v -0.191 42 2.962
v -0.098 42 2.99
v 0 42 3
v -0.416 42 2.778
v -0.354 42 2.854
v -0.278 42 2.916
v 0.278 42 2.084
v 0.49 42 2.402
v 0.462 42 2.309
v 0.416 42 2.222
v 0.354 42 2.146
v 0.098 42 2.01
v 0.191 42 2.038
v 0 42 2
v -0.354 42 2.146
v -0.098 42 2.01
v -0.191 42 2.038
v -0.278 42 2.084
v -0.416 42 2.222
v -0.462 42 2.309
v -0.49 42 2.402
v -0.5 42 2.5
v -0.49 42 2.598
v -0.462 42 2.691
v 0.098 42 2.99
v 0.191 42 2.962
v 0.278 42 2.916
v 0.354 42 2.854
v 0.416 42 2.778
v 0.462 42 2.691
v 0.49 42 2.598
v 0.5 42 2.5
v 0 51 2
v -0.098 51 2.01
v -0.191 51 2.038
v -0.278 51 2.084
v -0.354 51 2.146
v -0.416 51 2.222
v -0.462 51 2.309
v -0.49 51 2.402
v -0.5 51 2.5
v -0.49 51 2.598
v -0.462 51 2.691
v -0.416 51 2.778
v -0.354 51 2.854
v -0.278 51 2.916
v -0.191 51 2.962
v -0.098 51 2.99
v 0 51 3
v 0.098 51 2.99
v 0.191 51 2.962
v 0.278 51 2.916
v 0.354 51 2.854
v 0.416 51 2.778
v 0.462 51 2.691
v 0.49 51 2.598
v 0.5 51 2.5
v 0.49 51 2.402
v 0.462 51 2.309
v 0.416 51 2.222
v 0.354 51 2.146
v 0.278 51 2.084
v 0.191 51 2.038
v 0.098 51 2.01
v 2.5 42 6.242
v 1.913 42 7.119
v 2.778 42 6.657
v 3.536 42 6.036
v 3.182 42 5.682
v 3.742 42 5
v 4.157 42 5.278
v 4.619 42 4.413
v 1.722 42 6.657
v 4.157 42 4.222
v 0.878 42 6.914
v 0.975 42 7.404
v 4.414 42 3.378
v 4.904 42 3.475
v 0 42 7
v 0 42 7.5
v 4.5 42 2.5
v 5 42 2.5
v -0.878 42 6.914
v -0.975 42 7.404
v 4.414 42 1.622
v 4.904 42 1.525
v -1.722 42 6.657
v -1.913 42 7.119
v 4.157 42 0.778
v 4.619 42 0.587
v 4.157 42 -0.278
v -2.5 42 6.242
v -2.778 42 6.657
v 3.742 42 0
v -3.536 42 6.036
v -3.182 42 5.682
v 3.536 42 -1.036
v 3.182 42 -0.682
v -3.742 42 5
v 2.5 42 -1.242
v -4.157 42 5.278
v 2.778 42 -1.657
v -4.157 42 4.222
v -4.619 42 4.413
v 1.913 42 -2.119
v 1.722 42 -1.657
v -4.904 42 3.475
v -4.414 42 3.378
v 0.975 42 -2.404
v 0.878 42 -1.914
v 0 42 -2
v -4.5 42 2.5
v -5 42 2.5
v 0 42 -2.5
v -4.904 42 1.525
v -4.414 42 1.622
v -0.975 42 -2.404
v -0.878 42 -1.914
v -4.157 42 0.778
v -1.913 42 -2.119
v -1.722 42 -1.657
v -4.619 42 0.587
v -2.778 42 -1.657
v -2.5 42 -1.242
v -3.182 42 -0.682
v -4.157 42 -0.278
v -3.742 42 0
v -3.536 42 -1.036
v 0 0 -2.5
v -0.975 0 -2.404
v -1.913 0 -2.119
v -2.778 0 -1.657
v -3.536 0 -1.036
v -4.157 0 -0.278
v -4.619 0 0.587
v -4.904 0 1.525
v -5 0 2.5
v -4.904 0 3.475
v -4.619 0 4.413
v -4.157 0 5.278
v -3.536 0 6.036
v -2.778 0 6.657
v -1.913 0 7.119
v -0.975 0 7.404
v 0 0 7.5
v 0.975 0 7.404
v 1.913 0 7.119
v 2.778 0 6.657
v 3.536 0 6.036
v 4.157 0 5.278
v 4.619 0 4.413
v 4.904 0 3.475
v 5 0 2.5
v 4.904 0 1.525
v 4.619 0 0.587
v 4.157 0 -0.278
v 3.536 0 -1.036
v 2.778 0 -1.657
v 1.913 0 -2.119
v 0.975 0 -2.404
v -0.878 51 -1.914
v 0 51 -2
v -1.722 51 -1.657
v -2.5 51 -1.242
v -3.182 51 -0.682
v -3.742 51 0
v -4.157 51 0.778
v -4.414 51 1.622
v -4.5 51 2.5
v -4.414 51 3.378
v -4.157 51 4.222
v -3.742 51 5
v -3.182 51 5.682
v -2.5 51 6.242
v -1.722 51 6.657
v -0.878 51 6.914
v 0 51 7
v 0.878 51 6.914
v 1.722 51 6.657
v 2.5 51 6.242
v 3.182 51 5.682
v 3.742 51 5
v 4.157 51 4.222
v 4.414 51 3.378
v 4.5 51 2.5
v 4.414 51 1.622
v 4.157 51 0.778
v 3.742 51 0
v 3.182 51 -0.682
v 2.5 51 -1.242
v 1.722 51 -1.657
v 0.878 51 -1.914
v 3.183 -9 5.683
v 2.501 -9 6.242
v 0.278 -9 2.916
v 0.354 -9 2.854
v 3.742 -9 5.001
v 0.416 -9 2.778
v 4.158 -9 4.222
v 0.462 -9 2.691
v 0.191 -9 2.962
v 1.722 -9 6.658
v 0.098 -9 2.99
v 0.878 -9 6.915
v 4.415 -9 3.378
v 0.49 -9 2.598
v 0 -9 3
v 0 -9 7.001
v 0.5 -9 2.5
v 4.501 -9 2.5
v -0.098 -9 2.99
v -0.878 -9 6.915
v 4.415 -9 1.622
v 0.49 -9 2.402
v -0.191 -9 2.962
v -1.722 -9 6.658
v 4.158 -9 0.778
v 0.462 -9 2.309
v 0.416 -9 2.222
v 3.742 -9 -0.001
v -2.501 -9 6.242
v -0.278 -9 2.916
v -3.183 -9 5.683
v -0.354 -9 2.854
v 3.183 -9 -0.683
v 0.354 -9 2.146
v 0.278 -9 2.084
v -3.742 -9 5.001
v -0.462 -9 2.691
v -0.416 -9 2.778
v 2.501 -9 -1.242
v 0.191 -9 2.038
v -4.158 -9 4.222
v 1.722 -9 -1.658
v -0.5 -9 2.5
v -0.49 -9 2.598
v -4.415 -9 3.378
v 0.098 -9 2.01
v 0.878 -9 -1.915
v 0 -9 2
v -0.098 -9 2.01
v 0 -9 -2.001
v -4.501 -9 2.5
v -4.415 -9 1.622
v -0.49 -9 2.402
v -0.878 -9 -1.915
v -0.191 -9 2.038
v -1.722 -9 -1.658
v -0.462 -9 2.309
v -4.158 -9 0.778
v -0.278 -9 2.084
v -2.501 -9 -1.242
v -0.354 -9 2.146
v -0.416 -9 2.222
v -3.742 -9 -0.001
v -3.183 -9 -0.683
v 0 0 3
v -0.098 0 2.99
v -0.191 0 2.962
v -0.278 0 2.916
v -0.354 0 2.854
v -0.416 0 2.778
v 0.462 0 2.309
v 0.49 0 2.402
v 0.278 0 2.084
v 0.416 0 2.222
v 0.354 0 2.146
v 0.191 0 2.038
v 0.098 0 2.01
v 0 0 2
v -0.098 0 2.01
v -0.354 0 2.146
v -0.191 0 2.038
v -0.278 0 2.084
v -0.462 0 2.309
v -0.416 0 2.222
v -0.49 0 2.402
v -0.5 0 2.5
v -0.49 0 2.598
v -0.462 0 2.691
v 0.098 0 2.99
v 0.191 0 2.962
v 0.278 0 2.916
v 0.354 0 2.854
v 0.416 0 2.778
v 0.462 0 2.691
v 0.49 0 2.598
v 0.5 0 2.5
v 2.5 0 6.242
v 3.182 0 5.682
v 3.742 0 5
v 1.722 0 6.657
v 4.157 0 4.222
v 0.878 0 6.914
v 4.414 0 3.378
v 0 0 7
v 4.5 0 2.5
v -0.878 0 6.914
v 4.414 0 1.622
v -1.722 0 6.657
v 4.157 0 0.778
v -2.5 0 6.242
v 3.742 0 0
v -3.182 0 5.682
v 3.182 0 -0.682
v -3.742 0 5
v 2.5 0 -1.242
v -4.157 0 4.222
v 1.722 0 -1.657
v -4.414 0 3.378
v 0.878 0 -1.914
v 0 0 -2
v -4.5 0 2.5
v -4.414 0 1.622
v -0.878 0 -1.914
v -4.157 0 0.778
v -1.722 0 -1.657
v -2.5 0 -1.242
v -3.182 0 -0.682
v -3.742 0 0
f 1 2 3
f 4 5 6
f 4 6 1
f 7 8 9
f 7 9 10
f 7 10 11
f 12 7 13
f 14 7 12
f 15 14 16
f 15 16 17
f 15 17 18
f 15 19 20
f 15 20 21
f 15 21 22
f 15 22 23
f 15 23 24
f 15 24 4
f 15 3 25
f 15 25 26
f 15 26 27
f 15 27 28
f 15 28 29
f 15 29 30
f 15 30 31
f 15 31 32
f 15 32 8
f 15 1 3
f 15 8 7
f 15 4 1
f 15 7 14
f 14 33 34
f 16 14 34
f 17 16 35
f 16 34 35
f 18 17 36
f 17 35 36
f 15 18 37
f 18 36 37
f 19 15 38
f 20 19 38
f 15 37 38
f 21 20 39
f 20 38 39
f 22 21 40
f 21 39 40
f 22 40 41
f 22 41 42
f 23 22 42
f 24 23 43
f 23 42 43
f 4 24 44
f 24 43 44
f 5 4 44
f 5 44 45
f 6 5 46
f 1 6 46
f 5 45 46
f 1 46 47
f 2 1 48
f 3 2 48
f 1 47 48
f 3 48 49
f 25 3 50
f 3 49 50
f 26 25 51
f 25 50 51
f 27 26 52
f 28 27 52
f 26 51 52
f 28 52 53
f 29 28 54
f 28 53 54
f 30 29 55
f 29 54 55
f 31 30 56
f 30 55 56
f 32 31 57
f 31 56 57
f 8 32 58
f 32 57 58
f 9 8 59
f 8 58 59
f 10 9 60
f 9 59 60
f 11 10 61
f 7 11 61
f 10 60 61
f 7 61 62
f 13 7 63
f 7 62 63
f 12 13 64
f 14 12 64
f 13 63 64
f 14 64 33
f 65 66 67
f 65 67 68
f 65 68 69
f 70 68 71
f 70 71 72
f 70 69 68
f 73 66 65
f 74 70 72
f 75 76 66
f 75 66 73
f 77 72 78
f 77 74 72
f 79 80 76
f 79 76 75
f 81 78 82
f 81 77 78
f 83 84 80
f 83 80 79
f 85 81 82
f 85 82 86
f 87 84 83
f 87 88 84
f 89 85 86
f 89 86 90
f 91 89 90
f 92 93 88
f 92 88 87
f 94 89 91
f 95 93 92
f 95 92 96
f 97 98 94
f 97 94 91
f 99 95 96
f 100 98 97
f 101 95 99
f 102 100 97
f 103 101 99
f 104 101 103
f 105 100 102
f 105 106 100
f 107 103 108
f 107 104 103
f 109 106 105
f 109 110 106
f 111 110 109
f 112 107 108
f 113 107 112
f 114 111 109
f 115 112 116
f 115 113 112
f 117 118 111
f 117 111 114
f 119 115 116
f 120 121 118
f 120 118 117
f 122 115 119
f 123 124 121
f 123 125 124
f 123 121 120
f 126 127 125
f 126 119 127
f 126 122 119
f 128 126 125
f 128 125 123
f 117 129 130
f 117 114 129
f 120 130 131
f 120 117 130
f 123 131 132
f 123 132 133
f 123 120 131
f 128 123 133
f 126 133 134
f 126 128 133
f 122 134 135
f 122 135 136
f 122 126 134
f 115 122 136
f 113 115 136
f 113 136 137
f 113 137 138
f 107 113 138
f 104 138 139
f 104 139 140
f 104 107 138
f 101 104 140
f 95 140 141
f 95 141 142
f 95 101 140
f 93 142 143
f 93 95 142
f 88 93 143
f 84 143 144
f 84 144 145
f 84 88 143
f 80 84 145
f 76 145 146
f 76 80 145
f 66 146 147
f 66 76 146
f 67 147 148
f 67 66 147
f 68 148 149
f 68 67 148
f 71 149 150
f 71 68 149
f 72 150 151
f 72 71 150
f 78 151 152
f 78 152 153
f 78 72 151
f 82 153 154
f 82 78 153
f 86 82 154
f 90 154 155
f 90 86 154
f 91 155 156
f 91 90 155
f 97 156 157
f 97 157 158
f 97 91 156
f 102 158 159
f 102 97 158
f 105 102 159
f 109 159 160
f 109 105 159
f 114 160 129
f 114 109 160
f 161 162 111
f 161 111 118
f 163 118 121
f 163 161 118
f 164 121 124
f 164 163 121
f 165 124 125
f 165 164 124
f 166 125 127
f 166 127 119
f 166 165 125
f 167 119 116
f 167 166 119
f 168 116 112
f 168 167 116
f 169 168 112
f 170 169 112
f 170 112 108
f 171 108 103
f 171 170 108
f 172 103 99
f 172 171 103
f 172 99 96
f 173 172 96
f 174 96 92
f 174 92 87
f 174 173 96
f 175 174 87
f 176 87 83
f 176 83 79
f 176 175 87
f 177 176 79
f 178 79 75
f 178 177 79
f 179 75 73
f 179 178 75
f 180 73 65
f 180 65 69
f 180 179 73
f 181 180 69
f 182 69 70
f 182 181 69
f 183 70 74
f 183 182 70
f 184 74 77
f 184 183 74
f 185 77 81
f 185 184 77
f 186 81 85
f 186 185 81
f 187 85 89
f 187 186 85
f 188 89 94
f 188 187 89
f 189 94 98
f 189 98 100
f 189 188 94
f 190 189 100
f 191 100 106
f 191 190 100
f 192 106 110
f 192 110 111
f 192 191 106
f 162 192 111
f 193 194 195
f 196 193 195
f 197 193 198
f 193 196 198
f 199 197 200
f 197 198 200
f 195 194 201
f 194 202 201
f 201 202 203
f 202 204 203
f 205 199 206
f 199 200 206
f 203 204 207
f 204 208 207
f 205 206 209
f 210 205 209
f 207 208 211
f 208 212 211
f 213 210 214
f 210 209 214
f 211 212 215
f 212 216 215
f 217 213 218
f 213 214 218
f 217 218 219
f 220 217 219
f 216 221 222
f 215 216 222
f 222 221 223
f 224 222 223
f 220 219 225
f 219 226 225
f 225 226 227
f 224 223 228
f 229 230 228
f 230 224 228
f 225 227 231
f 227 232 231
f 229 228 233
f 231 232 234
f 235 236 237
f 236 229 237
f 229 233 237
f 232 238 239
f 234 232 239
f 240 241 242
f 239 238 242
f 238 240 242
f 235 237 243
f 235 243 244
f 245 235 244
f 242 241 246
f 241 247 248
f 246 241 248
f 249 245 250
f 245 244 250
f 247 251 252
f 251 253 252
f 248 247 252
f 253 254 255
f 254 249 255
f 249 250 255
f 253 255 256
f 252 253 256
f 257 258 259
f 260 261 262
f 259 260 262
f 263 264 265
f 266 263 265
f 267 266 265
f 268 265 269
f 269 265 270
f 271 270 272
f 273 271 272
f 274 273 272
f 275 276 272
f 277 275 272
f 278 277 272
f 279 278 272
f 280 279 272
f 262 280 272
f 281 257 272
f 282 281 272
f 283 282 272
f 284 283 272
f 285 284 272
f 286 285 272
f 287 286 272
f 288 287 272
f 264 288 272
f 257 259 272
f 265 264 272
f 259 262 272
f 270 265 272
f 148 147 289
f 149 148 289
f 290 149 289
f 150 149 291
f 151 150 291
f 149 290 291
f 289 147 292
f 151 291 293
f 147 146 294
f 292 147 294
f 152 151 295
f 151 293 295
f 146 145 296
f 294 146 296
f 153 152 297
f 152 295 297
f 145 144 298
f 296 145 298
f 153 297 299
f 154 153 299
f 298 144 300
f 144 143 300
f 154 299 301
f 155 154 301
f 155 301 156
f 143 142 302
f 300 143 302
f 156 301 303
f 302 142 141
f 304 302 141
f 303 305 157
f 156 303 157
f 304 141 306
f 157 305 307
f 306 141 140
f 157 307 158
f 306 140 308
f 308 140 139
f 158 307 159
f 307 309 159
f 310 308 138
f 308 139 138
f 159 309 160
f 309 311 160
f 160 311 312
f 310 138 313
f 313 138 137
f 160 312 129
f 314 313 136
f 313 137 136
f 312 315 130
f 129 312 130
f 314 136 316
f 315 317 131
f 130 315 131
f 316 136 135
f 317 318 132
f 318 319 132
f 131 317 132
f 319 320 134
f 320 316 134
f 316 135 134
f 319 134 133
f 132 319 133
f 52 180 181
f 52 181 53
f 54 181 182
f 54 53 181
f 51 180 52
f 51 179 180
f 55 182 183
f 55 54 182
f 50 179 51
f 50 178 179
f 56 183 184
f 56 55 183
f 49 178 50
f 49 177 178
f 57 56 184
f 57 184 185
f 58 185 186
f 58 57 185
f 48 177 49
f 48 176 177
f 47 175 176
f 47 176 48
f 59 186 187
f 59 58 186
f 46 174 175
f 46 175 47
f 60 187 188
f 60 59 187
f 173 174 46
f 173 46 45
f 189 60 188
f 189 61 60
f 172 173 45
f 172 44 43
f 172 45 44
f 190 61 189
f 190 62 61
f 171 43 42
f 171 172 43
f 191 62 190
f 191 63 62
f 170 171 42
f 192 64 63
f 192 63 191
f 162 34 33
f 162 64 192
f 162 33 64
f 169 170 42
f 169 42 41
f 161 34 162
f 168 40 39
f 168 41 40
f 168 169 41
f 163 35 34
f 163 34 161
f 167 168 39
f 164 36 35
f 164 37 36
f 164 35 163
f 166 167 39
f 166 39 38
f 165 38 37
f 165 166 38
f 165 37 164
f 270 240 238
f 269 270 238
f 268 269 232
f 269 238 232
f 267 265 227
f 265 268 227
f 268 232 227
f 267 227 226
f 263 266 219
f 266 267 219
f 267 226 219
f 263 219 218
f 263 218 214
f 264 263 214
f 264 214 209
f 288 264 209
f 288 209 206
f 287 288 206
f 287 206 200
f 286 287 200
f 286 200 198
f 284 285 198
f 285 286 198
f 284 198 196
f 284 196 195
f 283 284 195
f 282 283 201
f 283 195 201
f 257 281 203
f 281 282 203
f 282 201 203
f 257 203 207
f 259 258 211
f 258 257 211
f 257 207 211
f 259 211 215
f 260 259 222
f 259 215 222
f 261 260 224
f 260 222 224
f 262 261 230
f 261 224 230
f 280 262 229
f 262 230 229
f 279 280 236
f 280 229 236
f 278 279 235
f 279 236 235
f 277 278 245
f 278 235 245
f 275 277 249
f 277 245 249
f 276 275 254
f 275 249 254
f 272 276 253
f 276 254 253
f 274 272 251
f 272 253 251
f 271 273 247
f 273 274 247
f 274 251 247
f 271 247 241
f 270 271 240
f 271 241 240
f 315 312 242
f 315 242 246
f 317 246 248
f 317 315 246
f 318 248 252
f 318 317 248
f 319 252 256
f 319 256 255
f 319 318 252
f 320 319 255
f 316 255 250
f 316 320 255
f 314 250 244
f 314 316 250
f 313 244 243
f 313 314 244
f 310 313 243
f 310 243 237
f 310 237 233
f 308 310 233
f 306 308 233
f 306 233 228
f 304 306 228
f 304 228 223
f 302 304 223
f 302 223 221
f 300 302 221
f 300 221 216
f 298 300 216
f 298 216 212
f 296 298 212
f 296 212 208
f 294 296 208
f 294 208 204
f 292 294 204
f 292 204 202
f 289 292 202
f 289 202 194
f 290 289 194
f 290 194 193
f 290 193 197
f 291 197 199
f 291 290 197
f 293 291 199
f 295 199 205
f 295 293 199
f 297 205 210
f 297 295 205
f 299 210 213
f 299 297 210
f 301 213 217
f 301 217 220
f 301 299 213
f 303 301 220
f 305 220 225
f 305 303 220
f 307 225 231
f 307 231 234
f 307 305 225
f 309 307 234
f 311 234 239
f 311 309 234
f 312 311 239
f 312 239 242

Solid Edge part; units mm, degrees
sketch "Sketch1" plane through (0, 0, 0) normal (-1, 0, 0) x (0, -1, 0)
  line L0 (0, 2.5) -> (-42, 2.5)
  line L1 (-42, 2) -> (-42, 2.5)
  line L2 (-42, 2) -> (-51, 2)
  line L3 (-51, 2) -> (-51, -2)
  line L4 (-42, -2) -> (-51, -2)
  line L5 (-42, -2.5) -> (-42, -2)
  line L6 (0, -2.5) -> (-42, -2.5)
  line L7 (0, -2) -> (0, -2.5)
  line L8 (9, -2.001) -> (0, -2)
  line L9 (9, 2) -> (9, -2.001)
  line L10 (0, 2) -> (9, 2)
  line L11 (0, 2.5) -> (0, 2)
revolve "RevolvedProtrusion1" add sketch "Sketch1" angle 360 about axis through (0, 0, 2.5) along (0, 1, 0)
